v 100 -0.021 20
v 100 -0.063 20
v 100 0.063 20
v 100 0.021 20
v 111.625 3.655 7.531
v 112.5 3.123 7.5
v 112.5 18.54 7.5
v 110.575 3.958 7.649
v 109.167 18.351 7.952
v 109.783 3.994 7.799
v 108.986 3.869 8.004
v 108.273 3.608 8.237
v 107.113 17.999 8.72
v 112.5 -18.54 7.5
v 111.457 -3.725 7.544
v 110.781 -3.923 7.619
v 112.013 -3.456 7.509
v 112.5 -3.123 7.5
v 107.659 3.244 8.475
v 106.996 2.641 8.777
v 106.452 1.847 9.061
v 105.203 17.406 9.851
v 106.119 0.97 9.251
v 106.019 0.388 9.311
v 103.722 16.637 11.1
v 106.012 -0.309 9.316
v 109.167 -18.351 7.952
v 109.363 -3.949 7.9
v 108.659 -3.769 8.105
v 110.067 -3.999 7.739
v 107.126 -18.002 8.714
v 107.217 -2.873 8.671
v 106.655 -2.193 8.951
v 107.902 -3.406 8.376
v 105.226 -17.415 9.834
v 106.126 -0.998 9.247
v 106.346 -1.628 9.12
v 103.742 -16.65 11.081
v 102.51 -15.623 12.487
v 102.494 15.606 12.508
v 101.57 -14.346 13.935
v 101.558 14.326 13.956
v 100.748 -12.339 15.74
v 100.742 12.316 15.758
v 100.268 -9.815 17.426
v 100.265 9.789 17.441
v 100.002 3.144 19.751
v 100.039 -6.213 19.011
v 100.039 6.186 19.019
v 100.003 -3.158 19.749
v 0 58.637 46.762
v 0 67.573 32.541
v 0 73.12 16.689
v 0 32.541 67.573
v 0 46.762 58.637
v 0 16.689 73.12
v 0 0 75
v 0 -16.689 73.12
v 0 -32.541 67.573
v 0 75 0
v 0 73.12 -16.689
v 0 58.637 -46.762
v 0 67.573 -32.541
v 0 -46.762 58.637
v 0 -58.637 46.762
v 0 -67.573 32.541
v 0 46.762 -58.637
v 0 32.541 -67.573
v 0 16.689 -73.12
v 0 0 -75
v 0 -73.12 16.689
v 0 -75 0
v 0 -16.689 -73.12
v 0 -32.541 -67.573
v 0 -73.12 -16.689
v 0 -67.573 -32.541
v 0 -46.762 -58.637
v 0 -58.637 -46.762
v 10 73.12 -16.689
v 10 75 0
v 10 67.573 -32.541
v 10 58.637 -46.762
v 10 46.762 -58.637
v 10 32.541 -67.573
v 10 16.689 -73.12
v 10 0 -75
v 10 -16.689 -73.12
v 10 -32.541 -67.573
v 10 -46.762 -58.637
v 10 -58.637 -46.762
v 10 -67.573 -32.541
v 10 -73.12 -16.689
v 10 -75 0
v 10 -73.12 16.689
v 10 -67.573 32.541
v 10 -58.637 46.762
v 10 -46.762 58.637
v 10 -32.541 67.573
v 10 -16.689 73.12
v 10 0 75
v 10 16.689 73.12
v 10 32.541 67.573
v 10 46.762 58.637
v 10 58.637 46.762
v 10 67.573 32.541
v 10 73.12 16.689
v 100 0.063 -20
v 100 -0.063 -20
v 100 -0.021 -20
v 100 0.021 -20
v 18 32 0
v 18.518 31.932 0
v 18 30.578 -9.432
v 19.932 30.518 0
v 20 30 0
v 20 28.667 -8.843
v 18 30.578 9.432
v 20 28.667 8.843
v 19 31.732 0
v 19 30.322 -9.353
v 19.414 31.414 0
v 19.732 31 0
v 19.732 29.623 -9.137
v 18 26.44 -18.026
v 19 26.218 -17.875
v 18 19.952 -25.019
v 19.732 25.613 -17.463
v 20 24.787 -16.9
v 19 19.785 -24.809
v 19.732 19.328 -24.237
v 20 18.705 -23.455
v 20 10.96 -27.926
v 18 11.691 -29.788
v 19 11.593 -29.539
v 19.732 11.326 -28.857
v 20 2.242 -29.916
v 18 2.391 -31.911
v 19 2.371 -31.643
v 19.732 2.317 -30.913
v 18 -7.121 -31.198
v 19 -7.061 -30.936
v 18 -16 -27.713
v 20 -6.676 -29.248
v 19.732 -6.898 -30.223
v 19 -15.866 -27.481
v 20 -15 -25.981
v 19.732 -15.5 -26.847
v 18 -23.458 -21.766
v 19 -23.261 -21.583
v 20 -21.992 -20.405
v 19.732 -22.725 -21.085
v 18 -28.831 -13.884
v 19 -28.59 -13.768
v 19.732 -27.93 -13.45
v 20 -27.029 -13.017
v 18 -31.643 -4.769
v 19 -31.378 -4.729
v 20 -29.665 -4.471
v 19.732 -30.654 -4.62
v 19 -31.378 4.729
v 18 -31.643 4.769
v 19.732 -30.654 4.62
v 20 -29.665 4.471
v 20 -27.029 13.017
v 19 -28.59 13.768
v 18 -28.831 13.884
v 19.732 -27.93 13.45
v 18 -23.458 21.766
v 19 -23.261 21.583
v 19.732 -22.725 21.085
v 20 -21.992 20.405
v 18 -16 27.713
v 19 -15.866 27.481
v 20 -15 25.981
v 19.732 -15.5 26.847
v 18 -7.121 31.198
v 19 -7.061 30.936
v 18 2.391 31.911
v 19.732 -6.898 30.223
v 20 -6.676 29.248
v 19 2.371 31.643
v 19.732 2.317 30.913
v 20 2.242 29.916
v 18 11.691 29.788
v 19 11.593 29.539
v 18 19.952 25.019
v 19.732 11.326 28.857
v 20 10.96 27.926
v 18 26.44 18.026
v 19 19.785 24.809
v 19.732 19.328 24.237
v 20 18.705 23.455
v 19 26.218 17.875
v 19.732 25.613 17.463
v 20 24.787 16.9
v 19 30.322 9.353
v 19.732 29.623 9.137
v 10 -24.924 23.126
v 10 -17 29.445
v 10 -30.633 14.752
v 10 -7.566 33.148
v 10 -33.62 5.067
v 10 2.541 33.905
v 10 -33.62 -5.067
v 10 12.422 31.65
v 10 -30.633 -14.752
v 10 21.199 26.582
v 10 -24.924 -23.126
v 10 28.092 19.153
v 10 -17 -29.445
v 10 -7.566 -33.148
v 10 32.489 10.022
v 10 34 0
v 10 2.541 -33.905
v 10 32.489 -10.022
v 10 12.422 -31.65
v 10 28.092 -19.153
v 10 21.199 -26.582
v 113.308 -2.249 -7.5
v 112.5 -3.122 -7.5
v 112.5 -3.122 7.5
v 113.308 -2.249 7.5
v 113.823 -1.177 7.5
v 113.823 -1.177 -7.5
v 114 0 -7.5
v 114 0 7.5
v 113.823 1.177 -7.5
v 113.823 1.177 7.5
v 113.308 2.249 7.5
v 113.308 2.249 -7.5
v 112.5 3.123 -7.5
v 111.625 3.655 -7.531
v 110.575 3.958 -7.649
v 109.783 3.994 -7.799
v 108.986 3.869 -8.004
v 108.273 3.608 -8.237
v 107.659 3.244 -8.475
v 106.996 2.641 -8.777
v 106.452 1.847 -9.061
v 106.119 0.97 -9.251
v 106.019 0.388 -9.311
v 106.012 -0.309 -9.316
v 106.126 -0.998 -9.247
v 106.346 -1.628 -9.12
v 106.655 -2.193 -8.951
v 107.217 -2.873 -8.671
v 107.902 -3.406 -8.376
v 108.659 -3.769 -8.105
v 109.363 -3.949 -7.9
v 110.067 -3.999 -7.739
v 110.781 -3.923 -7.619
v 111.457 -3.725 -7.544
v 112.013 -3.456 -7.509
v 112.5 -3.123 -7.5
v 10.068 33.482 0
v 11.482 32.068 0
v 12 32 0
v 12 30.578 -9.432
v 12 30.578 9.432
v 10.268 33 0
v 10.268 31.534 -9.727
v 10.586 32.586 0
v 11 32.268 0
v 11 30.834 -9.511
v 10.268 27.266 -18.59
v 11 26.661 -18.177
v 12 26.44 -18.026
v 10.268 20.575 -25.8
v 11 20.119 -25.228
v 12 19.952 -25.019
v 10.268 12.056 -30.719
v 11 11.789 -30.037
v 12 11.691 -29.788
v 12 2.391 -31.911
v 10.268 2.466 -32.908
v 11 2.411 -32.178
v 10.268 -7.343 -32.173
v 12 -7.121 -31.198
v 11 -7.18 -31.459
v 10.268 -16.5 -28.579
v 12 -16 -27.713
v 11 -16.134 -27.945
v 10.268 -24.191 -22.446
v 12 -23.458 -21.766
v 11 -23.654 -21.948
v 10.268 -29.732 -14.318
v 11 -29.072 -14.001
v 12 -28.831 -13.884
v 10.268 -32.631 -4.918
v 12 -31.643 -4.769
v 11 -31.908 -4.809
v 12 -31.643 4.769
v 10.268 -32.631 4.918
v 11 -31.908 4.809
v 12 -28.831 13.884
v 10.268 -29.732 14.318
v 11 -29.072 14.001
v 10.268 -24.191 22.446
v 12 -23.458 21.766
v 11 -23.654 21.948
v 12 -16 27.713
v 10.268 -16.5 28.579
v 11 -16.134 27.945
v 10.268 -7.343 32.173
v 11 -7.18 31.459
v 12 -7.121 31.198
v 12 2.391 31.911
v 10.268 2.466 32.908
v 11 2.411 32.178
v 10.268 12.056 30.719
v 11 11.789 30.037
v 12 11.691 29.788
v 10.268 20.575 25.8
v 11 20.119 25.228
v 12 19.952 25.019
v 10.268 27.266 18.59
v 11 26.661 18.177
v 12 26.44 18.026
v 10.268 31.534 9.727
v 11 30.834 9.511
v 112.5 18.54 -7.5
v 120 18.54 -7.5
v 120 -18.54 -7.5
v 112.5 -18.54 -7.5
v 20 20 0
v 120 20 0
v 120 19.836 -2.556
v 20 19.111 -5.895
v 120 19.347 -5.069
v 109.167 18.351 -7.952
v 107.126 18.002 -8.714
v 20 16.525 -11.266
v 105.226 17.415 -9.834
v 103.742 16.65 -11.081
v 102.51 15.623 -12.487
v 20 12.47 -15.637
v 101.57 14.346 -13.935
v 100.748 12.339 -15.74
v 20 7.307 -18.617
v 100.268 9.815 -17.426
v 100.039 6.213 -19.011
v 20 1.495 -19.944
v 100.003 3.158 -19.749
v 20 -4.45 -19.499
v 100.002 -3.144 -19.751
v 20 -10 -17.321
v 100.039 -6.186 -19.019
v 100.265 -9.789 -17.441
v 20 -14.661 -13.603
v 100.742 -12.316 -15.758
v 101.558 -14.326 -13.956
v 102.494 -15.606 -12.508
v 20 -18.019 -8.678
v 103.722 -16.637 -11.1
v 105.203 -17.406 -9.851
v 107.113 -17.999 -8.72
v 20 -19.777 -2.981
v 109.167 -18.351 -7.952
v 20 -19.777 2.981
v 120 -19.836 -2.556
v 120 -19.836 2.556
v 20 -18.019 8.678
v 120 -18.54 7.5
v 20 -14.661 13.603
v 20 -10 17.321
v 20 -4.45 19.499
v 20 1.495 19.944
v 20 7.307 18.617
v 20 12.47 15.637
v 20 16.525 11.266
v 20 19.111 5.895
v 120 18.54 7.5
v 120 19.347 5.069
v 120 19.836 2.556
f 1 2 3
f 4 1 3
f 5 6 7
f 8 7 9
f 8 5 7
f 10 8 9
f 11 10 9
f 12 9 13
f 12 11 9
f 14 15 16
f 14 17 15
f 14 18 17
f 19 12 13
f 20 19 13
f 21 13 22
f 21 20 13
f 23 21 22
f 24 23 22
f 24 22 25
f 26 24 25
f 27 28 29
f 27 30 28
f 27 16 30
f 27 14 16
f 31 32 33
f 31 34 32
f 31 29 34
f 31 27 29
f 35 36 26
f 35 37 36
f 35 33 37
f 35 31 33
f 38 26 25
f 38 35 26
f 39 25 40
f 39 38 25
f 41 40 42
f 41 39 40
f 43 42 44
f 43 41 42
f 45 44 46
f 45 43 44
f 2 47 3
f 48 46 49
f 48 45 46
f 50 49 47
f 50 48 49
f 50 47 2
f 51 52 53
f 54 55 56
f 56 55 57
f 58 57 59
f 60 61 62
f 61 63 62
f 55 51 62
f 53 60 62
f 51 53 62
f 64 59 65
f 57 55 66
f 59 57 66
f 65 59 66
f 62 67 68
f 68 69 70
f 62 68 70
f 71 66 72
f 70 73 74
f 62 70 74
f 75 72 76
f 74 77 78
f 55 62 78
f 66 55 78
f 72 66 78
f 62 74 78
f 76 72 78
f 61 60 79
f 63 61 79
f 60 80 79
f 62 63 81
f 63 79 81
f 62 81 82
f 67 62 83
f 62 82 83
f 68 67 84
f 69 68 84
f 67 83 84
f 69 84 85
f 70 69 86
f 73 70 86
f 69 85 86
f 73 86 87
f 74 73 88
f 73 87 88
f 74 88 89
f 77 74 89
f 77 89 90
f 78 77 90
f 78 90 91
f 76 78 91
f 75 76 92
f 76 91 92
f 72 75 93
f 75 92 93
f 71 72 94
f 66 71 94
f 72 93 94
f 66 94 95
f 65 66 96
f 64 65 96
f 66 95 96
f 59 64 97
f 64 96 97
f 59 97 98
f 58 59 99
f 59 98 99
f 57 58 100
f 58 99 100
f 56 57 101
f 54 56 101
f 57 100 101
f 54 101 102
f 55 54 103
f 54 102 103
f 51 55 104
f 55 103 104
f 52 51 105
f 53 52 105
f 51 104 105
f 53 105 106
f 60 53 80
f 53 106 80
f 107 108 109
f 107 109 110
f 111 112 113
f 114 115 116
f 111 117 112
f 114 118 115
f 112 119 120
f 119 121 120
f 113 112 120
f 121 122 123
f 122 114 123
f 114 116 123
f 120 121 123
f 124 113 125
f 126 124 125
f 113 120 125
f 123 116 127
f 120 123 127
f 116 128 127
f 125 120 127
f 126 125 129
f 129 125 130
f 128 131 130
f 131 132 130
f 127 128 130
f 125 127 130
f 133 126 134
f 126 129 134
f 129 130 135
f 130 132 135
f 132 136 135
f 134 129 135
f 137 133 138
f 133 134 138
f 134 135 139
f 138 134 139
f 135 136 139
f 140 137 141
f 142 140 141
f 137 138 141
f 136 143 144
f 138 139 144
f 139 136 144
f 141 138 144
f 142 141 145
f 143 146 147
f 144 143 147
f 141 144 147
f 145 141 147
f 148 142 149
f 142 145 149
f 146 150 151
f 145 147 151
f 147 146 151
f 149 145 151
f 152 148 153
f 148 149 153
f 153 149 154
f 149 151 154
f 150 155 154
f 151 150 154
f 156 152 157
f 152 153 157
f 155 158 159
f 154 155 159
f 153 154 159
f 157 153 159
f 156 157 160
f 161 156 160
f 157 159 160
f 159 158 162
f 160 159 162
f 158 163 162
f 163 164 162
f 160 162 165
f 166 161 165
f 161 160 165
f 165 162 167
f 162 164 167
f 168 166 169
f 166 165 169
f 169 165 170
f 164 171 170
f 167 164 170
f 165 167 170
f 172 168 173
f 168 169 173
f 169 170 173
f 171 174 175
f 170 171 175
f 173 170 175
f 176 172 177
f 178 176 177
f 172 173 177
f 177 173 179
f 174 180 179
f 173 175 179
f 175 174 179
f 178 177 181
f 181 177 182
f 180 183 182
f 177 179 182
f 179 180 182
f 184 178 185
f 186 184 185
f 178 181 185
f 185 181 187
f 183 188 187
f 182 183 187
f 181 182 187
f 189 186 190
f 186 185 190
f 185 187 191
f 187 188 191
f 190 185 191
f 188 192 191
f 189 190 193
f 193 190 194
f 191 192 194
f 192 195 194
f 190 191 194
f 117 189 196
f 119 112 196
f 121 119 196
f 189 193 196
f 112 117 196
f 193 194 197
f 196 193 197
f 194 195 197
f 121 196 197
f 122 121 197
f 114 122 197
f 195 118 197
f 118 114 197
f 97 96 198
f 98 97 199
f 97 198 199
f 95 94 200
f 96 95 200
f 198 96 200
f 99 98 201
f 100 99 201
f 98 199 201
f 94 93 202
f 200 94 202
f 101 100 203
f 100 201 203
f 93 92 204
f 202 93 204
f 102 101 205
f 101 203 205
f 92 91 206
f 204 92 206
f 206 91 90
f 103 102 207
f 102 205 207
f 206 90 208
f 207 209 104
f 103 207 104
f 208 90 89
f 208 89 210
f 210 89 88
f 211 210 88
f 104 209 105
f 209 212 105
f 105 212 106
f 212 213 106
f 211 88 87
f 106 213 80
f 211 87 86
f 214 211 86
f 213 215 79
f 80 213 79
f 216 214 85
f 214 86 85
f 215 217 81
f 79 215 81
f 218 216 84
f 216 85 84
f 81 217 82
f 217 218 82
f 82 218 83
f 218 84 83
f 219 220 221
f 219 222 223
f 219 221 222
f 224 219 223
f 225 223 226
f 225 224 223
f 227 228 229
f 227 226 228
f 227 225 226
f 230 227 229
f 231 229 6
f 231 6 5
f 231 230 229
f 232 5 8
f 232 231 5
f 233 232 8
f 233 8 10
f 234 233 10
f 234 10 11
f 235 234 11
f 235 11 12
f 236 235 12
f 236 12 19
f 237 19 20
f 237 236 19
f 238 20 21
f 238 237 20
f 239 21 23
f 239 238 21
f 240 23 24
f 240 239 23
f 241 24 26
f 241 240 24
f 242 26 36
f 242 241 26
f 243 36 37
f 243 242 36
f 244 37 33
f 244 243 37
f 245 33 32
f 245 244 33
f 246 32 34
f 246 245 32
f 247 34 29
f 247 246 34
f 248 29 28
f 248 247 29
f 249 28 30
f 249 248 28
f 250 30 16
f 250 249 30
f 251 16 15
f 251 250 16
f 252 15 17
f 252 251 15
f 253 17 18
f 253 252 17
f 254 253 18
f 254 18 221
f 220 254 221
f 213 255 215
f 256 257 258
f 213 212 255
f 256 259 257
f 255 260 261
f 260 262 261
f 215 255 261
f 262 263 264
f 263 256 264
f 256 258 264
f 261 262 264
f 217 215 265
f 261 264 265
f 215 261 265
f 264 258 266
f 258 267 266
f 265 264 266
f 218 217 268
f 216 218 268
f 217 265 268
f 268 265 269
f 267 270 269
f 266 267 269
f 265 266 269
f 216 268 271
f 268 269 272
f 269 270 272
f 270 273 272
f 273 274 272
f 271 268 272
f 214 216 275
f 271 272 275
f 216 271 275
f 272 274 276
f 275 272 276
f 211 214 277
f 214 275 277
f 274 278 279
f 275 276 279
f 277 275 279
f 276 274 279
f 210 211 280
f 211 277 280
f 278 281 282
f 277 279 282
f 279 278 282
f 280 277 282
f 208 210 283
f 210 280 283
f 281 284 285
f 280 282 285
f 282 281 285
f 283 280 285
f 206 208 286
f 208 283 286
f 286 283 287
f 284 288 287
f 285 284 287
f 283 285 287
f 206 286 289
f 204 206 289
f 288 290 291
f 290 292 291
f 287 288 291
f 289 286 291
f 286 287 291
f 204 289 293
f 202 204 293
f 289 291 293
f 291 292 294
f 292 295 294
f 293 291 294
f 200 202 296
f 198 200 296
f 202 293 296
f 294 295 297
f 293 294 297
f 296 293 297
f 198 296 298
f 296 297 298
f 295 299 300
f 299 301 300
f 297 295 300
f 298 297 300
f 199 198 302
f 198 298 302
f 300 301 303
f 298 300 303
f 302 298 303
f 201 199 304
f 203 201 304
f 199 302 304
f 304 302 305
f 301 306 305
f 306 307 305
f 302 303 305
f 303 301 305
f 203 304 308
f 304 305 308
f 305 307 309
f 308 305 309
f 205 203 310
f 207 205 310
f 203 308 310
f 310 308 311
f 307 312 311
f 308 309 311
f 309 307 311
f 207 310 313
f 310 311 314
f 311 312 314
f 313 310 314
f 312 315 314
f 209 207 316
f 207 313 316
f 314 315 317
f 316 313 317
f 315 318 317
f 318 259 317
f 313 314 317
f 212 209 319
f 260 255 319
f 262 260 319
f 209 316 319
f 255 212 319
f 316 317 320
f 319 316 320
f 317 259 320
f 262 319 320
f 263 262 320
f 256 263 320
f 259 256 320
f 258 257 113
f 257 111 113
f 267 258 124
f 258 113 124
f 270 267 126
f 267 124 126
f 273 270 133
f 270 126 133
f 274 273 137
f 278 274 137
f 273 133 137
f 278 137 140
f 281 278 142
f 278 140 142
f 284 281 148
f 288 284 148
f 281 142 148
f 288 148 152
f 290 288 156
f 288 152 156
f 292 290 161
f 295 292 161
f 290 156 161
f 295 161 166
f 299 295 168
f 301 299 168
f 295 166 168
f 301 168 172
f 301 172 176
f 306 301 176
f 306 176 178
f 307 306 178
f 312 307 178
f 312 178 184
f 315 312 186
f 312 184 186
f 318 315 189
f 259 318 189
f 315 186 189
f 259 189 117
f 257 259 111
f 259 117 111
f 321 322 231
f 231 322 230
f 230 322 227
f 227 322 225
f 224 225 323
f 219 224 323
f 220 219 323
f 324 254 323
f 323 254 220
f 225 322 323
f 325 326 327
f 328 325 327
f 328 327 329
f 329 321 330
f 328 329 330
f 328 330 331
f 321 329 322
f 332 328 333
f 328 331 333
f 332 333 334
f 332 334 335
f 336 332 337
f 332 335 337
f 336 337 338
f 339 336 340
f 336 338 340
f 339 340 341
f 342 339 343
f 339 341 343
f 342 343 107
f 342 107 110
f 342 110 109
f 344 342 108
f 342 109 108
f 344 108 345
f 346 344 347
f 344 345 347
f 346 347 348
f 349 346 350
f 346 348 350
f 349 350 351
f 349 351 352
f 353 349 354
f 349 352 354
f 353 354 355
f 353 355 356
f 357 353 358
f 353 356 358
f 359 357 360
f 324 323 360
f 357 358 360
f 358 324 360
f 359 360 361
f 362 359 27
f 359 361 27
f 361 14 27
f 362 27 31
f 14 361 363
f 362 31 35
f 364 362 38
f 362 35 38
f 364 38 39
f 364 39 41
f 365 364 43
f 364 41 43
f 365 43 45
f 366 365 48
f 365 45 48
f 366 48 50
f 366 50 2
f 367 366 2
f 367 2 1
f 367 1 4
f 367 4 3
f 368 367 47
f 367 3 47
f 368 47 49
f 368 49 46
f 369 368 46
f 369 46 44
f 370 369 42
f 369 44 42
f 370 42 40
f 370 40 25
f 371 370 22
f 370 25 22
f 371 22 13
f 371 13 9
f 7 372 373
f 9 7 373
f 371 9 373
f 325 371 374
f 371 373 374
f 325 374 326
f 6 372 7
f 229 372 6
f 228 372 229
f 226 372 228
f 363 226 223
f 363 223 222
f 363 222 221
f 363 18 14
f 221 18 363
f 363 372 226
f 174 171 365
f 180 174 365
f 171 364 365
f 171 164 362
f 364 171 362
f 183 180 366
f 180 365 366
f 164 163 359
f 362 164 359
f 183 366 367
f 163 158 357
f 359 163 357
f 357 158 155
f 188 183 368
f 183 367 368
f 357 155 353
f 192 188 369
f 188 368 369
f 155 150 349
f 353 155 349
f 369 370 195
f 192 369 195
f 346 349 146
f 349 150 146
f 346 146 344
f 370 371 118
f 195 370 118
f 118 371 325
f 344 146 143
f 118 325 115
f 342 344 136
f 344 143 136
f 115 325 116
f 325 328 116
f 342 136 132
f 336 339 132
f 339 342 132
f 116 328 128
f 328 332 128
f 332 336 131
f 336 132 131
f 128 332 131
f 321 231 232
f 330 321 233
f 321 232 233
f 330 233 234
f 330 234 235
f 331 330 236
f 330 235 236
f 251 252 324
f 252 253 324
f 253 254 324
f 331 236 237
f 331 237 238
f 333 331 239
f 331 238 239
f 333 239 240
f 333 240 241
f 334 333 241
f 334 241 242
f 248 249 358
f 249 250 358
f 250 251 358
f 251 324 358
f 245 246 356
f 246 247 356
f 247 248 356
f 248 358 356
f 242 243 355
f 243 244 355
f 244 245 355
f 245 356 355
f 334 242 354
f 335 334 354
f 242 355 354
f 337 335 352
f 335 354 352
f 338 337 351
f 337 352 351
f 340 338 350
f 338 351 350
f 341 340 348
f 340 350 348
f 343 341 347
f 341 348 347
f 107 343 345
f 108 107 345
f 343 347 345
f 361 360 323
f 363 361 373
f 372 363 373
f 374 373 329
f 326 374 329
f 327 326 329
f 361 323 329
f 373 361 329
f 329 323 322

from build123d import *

# Parameters (mm, degrees)
CUT_EXTRUDE1_DEPTH      = 20
FILLET1_R               = 12.5
CUT_EXTRUDE2_DEPTH      = 164.802472582
CUT_EXTRUDE2_DEPTH_BACK = 164.802472582
SKETCH3_R               = 4


with BuildPart() as part:
    # Sketch1 → Revolve1 (revolve)
    with BuildSketch(Plane.XY):
        with BuildLine():
            Line((0, 0), (0, 75))
            Line((0, 75), (10, 75))
            Line((10, 75), (10, 34))
            ThreePointArc((10, 34), (10.585786438, 32.585786438), (12, 32))
            Line((12, 32), (18, 32))
            ThreePointArc((18, 32), (19.414213562, 31.414213562), (20, 30))
            Line((20, 30), (20, 20))
            Line((20, 20), (120, 20))
            Line((120, 20), (120, 0))
            Line((120, 0), (10, 0))
            Line((10, 0), (0, 0))
        make_face()
    revolve(axis=Axis((120, 0, 0), (-1, 0, 0)))

    # Sketch2 → Cut-Extrude1 (cut)
    with BuildSketch(Plane(origin=(120, 0, 0), x_dir=(0, 0, -1), z_dir=(1, 0, 0))):
        with BuildLine():
            Line((-7.5, 18.540496218), (-7.5, -18.540496218))
            ThreePointArc((-7.5, -18.540496218), (-20, 0), (-7.5, 18.540496218))
        make_face()
        with BuildLine():
            Line((7.5, 18.540496218), (7.5, -18.540496218))
            ThreePointArc((7.5, -18.540496218), (20, 0), (7.5, 18.540496218))
        make_face()
    extrude(amount=-CUT_EXTRUDE1_DEPTH, mode=Mode.SUBTRACT)

    # Fillet1
    fillet1_edges = [part.edges().sort_by_distance(p)[0] for p in [
        (100, 0, -7.5),
        (100, 0, 7.5),
    ]]
    fillet(fillet1_edges, radius=FILLET1_R - 0.0001)  # a hair under: the kernel refuses the full size

    # Sketch3 → Cut-Extrude2 (cut, two sides: drawn at the far end of the back side and taken through both)
    with BuildSketch(Plane.XY.offset(7.5).offset(-CUT_EXTRUDE2_DEPTH_BACK)):
        with Locations(Location((110, 0, 0), (0, 0, 308.682187453))):
            Circle(SKETCH3_R)
    extrude(amount=CUT_EXTRUDE2_DEPTH + CUT_EXTRUDE2_DEPTH_BACK, mode=Mode.SUBTRACT)


solid = part.part
